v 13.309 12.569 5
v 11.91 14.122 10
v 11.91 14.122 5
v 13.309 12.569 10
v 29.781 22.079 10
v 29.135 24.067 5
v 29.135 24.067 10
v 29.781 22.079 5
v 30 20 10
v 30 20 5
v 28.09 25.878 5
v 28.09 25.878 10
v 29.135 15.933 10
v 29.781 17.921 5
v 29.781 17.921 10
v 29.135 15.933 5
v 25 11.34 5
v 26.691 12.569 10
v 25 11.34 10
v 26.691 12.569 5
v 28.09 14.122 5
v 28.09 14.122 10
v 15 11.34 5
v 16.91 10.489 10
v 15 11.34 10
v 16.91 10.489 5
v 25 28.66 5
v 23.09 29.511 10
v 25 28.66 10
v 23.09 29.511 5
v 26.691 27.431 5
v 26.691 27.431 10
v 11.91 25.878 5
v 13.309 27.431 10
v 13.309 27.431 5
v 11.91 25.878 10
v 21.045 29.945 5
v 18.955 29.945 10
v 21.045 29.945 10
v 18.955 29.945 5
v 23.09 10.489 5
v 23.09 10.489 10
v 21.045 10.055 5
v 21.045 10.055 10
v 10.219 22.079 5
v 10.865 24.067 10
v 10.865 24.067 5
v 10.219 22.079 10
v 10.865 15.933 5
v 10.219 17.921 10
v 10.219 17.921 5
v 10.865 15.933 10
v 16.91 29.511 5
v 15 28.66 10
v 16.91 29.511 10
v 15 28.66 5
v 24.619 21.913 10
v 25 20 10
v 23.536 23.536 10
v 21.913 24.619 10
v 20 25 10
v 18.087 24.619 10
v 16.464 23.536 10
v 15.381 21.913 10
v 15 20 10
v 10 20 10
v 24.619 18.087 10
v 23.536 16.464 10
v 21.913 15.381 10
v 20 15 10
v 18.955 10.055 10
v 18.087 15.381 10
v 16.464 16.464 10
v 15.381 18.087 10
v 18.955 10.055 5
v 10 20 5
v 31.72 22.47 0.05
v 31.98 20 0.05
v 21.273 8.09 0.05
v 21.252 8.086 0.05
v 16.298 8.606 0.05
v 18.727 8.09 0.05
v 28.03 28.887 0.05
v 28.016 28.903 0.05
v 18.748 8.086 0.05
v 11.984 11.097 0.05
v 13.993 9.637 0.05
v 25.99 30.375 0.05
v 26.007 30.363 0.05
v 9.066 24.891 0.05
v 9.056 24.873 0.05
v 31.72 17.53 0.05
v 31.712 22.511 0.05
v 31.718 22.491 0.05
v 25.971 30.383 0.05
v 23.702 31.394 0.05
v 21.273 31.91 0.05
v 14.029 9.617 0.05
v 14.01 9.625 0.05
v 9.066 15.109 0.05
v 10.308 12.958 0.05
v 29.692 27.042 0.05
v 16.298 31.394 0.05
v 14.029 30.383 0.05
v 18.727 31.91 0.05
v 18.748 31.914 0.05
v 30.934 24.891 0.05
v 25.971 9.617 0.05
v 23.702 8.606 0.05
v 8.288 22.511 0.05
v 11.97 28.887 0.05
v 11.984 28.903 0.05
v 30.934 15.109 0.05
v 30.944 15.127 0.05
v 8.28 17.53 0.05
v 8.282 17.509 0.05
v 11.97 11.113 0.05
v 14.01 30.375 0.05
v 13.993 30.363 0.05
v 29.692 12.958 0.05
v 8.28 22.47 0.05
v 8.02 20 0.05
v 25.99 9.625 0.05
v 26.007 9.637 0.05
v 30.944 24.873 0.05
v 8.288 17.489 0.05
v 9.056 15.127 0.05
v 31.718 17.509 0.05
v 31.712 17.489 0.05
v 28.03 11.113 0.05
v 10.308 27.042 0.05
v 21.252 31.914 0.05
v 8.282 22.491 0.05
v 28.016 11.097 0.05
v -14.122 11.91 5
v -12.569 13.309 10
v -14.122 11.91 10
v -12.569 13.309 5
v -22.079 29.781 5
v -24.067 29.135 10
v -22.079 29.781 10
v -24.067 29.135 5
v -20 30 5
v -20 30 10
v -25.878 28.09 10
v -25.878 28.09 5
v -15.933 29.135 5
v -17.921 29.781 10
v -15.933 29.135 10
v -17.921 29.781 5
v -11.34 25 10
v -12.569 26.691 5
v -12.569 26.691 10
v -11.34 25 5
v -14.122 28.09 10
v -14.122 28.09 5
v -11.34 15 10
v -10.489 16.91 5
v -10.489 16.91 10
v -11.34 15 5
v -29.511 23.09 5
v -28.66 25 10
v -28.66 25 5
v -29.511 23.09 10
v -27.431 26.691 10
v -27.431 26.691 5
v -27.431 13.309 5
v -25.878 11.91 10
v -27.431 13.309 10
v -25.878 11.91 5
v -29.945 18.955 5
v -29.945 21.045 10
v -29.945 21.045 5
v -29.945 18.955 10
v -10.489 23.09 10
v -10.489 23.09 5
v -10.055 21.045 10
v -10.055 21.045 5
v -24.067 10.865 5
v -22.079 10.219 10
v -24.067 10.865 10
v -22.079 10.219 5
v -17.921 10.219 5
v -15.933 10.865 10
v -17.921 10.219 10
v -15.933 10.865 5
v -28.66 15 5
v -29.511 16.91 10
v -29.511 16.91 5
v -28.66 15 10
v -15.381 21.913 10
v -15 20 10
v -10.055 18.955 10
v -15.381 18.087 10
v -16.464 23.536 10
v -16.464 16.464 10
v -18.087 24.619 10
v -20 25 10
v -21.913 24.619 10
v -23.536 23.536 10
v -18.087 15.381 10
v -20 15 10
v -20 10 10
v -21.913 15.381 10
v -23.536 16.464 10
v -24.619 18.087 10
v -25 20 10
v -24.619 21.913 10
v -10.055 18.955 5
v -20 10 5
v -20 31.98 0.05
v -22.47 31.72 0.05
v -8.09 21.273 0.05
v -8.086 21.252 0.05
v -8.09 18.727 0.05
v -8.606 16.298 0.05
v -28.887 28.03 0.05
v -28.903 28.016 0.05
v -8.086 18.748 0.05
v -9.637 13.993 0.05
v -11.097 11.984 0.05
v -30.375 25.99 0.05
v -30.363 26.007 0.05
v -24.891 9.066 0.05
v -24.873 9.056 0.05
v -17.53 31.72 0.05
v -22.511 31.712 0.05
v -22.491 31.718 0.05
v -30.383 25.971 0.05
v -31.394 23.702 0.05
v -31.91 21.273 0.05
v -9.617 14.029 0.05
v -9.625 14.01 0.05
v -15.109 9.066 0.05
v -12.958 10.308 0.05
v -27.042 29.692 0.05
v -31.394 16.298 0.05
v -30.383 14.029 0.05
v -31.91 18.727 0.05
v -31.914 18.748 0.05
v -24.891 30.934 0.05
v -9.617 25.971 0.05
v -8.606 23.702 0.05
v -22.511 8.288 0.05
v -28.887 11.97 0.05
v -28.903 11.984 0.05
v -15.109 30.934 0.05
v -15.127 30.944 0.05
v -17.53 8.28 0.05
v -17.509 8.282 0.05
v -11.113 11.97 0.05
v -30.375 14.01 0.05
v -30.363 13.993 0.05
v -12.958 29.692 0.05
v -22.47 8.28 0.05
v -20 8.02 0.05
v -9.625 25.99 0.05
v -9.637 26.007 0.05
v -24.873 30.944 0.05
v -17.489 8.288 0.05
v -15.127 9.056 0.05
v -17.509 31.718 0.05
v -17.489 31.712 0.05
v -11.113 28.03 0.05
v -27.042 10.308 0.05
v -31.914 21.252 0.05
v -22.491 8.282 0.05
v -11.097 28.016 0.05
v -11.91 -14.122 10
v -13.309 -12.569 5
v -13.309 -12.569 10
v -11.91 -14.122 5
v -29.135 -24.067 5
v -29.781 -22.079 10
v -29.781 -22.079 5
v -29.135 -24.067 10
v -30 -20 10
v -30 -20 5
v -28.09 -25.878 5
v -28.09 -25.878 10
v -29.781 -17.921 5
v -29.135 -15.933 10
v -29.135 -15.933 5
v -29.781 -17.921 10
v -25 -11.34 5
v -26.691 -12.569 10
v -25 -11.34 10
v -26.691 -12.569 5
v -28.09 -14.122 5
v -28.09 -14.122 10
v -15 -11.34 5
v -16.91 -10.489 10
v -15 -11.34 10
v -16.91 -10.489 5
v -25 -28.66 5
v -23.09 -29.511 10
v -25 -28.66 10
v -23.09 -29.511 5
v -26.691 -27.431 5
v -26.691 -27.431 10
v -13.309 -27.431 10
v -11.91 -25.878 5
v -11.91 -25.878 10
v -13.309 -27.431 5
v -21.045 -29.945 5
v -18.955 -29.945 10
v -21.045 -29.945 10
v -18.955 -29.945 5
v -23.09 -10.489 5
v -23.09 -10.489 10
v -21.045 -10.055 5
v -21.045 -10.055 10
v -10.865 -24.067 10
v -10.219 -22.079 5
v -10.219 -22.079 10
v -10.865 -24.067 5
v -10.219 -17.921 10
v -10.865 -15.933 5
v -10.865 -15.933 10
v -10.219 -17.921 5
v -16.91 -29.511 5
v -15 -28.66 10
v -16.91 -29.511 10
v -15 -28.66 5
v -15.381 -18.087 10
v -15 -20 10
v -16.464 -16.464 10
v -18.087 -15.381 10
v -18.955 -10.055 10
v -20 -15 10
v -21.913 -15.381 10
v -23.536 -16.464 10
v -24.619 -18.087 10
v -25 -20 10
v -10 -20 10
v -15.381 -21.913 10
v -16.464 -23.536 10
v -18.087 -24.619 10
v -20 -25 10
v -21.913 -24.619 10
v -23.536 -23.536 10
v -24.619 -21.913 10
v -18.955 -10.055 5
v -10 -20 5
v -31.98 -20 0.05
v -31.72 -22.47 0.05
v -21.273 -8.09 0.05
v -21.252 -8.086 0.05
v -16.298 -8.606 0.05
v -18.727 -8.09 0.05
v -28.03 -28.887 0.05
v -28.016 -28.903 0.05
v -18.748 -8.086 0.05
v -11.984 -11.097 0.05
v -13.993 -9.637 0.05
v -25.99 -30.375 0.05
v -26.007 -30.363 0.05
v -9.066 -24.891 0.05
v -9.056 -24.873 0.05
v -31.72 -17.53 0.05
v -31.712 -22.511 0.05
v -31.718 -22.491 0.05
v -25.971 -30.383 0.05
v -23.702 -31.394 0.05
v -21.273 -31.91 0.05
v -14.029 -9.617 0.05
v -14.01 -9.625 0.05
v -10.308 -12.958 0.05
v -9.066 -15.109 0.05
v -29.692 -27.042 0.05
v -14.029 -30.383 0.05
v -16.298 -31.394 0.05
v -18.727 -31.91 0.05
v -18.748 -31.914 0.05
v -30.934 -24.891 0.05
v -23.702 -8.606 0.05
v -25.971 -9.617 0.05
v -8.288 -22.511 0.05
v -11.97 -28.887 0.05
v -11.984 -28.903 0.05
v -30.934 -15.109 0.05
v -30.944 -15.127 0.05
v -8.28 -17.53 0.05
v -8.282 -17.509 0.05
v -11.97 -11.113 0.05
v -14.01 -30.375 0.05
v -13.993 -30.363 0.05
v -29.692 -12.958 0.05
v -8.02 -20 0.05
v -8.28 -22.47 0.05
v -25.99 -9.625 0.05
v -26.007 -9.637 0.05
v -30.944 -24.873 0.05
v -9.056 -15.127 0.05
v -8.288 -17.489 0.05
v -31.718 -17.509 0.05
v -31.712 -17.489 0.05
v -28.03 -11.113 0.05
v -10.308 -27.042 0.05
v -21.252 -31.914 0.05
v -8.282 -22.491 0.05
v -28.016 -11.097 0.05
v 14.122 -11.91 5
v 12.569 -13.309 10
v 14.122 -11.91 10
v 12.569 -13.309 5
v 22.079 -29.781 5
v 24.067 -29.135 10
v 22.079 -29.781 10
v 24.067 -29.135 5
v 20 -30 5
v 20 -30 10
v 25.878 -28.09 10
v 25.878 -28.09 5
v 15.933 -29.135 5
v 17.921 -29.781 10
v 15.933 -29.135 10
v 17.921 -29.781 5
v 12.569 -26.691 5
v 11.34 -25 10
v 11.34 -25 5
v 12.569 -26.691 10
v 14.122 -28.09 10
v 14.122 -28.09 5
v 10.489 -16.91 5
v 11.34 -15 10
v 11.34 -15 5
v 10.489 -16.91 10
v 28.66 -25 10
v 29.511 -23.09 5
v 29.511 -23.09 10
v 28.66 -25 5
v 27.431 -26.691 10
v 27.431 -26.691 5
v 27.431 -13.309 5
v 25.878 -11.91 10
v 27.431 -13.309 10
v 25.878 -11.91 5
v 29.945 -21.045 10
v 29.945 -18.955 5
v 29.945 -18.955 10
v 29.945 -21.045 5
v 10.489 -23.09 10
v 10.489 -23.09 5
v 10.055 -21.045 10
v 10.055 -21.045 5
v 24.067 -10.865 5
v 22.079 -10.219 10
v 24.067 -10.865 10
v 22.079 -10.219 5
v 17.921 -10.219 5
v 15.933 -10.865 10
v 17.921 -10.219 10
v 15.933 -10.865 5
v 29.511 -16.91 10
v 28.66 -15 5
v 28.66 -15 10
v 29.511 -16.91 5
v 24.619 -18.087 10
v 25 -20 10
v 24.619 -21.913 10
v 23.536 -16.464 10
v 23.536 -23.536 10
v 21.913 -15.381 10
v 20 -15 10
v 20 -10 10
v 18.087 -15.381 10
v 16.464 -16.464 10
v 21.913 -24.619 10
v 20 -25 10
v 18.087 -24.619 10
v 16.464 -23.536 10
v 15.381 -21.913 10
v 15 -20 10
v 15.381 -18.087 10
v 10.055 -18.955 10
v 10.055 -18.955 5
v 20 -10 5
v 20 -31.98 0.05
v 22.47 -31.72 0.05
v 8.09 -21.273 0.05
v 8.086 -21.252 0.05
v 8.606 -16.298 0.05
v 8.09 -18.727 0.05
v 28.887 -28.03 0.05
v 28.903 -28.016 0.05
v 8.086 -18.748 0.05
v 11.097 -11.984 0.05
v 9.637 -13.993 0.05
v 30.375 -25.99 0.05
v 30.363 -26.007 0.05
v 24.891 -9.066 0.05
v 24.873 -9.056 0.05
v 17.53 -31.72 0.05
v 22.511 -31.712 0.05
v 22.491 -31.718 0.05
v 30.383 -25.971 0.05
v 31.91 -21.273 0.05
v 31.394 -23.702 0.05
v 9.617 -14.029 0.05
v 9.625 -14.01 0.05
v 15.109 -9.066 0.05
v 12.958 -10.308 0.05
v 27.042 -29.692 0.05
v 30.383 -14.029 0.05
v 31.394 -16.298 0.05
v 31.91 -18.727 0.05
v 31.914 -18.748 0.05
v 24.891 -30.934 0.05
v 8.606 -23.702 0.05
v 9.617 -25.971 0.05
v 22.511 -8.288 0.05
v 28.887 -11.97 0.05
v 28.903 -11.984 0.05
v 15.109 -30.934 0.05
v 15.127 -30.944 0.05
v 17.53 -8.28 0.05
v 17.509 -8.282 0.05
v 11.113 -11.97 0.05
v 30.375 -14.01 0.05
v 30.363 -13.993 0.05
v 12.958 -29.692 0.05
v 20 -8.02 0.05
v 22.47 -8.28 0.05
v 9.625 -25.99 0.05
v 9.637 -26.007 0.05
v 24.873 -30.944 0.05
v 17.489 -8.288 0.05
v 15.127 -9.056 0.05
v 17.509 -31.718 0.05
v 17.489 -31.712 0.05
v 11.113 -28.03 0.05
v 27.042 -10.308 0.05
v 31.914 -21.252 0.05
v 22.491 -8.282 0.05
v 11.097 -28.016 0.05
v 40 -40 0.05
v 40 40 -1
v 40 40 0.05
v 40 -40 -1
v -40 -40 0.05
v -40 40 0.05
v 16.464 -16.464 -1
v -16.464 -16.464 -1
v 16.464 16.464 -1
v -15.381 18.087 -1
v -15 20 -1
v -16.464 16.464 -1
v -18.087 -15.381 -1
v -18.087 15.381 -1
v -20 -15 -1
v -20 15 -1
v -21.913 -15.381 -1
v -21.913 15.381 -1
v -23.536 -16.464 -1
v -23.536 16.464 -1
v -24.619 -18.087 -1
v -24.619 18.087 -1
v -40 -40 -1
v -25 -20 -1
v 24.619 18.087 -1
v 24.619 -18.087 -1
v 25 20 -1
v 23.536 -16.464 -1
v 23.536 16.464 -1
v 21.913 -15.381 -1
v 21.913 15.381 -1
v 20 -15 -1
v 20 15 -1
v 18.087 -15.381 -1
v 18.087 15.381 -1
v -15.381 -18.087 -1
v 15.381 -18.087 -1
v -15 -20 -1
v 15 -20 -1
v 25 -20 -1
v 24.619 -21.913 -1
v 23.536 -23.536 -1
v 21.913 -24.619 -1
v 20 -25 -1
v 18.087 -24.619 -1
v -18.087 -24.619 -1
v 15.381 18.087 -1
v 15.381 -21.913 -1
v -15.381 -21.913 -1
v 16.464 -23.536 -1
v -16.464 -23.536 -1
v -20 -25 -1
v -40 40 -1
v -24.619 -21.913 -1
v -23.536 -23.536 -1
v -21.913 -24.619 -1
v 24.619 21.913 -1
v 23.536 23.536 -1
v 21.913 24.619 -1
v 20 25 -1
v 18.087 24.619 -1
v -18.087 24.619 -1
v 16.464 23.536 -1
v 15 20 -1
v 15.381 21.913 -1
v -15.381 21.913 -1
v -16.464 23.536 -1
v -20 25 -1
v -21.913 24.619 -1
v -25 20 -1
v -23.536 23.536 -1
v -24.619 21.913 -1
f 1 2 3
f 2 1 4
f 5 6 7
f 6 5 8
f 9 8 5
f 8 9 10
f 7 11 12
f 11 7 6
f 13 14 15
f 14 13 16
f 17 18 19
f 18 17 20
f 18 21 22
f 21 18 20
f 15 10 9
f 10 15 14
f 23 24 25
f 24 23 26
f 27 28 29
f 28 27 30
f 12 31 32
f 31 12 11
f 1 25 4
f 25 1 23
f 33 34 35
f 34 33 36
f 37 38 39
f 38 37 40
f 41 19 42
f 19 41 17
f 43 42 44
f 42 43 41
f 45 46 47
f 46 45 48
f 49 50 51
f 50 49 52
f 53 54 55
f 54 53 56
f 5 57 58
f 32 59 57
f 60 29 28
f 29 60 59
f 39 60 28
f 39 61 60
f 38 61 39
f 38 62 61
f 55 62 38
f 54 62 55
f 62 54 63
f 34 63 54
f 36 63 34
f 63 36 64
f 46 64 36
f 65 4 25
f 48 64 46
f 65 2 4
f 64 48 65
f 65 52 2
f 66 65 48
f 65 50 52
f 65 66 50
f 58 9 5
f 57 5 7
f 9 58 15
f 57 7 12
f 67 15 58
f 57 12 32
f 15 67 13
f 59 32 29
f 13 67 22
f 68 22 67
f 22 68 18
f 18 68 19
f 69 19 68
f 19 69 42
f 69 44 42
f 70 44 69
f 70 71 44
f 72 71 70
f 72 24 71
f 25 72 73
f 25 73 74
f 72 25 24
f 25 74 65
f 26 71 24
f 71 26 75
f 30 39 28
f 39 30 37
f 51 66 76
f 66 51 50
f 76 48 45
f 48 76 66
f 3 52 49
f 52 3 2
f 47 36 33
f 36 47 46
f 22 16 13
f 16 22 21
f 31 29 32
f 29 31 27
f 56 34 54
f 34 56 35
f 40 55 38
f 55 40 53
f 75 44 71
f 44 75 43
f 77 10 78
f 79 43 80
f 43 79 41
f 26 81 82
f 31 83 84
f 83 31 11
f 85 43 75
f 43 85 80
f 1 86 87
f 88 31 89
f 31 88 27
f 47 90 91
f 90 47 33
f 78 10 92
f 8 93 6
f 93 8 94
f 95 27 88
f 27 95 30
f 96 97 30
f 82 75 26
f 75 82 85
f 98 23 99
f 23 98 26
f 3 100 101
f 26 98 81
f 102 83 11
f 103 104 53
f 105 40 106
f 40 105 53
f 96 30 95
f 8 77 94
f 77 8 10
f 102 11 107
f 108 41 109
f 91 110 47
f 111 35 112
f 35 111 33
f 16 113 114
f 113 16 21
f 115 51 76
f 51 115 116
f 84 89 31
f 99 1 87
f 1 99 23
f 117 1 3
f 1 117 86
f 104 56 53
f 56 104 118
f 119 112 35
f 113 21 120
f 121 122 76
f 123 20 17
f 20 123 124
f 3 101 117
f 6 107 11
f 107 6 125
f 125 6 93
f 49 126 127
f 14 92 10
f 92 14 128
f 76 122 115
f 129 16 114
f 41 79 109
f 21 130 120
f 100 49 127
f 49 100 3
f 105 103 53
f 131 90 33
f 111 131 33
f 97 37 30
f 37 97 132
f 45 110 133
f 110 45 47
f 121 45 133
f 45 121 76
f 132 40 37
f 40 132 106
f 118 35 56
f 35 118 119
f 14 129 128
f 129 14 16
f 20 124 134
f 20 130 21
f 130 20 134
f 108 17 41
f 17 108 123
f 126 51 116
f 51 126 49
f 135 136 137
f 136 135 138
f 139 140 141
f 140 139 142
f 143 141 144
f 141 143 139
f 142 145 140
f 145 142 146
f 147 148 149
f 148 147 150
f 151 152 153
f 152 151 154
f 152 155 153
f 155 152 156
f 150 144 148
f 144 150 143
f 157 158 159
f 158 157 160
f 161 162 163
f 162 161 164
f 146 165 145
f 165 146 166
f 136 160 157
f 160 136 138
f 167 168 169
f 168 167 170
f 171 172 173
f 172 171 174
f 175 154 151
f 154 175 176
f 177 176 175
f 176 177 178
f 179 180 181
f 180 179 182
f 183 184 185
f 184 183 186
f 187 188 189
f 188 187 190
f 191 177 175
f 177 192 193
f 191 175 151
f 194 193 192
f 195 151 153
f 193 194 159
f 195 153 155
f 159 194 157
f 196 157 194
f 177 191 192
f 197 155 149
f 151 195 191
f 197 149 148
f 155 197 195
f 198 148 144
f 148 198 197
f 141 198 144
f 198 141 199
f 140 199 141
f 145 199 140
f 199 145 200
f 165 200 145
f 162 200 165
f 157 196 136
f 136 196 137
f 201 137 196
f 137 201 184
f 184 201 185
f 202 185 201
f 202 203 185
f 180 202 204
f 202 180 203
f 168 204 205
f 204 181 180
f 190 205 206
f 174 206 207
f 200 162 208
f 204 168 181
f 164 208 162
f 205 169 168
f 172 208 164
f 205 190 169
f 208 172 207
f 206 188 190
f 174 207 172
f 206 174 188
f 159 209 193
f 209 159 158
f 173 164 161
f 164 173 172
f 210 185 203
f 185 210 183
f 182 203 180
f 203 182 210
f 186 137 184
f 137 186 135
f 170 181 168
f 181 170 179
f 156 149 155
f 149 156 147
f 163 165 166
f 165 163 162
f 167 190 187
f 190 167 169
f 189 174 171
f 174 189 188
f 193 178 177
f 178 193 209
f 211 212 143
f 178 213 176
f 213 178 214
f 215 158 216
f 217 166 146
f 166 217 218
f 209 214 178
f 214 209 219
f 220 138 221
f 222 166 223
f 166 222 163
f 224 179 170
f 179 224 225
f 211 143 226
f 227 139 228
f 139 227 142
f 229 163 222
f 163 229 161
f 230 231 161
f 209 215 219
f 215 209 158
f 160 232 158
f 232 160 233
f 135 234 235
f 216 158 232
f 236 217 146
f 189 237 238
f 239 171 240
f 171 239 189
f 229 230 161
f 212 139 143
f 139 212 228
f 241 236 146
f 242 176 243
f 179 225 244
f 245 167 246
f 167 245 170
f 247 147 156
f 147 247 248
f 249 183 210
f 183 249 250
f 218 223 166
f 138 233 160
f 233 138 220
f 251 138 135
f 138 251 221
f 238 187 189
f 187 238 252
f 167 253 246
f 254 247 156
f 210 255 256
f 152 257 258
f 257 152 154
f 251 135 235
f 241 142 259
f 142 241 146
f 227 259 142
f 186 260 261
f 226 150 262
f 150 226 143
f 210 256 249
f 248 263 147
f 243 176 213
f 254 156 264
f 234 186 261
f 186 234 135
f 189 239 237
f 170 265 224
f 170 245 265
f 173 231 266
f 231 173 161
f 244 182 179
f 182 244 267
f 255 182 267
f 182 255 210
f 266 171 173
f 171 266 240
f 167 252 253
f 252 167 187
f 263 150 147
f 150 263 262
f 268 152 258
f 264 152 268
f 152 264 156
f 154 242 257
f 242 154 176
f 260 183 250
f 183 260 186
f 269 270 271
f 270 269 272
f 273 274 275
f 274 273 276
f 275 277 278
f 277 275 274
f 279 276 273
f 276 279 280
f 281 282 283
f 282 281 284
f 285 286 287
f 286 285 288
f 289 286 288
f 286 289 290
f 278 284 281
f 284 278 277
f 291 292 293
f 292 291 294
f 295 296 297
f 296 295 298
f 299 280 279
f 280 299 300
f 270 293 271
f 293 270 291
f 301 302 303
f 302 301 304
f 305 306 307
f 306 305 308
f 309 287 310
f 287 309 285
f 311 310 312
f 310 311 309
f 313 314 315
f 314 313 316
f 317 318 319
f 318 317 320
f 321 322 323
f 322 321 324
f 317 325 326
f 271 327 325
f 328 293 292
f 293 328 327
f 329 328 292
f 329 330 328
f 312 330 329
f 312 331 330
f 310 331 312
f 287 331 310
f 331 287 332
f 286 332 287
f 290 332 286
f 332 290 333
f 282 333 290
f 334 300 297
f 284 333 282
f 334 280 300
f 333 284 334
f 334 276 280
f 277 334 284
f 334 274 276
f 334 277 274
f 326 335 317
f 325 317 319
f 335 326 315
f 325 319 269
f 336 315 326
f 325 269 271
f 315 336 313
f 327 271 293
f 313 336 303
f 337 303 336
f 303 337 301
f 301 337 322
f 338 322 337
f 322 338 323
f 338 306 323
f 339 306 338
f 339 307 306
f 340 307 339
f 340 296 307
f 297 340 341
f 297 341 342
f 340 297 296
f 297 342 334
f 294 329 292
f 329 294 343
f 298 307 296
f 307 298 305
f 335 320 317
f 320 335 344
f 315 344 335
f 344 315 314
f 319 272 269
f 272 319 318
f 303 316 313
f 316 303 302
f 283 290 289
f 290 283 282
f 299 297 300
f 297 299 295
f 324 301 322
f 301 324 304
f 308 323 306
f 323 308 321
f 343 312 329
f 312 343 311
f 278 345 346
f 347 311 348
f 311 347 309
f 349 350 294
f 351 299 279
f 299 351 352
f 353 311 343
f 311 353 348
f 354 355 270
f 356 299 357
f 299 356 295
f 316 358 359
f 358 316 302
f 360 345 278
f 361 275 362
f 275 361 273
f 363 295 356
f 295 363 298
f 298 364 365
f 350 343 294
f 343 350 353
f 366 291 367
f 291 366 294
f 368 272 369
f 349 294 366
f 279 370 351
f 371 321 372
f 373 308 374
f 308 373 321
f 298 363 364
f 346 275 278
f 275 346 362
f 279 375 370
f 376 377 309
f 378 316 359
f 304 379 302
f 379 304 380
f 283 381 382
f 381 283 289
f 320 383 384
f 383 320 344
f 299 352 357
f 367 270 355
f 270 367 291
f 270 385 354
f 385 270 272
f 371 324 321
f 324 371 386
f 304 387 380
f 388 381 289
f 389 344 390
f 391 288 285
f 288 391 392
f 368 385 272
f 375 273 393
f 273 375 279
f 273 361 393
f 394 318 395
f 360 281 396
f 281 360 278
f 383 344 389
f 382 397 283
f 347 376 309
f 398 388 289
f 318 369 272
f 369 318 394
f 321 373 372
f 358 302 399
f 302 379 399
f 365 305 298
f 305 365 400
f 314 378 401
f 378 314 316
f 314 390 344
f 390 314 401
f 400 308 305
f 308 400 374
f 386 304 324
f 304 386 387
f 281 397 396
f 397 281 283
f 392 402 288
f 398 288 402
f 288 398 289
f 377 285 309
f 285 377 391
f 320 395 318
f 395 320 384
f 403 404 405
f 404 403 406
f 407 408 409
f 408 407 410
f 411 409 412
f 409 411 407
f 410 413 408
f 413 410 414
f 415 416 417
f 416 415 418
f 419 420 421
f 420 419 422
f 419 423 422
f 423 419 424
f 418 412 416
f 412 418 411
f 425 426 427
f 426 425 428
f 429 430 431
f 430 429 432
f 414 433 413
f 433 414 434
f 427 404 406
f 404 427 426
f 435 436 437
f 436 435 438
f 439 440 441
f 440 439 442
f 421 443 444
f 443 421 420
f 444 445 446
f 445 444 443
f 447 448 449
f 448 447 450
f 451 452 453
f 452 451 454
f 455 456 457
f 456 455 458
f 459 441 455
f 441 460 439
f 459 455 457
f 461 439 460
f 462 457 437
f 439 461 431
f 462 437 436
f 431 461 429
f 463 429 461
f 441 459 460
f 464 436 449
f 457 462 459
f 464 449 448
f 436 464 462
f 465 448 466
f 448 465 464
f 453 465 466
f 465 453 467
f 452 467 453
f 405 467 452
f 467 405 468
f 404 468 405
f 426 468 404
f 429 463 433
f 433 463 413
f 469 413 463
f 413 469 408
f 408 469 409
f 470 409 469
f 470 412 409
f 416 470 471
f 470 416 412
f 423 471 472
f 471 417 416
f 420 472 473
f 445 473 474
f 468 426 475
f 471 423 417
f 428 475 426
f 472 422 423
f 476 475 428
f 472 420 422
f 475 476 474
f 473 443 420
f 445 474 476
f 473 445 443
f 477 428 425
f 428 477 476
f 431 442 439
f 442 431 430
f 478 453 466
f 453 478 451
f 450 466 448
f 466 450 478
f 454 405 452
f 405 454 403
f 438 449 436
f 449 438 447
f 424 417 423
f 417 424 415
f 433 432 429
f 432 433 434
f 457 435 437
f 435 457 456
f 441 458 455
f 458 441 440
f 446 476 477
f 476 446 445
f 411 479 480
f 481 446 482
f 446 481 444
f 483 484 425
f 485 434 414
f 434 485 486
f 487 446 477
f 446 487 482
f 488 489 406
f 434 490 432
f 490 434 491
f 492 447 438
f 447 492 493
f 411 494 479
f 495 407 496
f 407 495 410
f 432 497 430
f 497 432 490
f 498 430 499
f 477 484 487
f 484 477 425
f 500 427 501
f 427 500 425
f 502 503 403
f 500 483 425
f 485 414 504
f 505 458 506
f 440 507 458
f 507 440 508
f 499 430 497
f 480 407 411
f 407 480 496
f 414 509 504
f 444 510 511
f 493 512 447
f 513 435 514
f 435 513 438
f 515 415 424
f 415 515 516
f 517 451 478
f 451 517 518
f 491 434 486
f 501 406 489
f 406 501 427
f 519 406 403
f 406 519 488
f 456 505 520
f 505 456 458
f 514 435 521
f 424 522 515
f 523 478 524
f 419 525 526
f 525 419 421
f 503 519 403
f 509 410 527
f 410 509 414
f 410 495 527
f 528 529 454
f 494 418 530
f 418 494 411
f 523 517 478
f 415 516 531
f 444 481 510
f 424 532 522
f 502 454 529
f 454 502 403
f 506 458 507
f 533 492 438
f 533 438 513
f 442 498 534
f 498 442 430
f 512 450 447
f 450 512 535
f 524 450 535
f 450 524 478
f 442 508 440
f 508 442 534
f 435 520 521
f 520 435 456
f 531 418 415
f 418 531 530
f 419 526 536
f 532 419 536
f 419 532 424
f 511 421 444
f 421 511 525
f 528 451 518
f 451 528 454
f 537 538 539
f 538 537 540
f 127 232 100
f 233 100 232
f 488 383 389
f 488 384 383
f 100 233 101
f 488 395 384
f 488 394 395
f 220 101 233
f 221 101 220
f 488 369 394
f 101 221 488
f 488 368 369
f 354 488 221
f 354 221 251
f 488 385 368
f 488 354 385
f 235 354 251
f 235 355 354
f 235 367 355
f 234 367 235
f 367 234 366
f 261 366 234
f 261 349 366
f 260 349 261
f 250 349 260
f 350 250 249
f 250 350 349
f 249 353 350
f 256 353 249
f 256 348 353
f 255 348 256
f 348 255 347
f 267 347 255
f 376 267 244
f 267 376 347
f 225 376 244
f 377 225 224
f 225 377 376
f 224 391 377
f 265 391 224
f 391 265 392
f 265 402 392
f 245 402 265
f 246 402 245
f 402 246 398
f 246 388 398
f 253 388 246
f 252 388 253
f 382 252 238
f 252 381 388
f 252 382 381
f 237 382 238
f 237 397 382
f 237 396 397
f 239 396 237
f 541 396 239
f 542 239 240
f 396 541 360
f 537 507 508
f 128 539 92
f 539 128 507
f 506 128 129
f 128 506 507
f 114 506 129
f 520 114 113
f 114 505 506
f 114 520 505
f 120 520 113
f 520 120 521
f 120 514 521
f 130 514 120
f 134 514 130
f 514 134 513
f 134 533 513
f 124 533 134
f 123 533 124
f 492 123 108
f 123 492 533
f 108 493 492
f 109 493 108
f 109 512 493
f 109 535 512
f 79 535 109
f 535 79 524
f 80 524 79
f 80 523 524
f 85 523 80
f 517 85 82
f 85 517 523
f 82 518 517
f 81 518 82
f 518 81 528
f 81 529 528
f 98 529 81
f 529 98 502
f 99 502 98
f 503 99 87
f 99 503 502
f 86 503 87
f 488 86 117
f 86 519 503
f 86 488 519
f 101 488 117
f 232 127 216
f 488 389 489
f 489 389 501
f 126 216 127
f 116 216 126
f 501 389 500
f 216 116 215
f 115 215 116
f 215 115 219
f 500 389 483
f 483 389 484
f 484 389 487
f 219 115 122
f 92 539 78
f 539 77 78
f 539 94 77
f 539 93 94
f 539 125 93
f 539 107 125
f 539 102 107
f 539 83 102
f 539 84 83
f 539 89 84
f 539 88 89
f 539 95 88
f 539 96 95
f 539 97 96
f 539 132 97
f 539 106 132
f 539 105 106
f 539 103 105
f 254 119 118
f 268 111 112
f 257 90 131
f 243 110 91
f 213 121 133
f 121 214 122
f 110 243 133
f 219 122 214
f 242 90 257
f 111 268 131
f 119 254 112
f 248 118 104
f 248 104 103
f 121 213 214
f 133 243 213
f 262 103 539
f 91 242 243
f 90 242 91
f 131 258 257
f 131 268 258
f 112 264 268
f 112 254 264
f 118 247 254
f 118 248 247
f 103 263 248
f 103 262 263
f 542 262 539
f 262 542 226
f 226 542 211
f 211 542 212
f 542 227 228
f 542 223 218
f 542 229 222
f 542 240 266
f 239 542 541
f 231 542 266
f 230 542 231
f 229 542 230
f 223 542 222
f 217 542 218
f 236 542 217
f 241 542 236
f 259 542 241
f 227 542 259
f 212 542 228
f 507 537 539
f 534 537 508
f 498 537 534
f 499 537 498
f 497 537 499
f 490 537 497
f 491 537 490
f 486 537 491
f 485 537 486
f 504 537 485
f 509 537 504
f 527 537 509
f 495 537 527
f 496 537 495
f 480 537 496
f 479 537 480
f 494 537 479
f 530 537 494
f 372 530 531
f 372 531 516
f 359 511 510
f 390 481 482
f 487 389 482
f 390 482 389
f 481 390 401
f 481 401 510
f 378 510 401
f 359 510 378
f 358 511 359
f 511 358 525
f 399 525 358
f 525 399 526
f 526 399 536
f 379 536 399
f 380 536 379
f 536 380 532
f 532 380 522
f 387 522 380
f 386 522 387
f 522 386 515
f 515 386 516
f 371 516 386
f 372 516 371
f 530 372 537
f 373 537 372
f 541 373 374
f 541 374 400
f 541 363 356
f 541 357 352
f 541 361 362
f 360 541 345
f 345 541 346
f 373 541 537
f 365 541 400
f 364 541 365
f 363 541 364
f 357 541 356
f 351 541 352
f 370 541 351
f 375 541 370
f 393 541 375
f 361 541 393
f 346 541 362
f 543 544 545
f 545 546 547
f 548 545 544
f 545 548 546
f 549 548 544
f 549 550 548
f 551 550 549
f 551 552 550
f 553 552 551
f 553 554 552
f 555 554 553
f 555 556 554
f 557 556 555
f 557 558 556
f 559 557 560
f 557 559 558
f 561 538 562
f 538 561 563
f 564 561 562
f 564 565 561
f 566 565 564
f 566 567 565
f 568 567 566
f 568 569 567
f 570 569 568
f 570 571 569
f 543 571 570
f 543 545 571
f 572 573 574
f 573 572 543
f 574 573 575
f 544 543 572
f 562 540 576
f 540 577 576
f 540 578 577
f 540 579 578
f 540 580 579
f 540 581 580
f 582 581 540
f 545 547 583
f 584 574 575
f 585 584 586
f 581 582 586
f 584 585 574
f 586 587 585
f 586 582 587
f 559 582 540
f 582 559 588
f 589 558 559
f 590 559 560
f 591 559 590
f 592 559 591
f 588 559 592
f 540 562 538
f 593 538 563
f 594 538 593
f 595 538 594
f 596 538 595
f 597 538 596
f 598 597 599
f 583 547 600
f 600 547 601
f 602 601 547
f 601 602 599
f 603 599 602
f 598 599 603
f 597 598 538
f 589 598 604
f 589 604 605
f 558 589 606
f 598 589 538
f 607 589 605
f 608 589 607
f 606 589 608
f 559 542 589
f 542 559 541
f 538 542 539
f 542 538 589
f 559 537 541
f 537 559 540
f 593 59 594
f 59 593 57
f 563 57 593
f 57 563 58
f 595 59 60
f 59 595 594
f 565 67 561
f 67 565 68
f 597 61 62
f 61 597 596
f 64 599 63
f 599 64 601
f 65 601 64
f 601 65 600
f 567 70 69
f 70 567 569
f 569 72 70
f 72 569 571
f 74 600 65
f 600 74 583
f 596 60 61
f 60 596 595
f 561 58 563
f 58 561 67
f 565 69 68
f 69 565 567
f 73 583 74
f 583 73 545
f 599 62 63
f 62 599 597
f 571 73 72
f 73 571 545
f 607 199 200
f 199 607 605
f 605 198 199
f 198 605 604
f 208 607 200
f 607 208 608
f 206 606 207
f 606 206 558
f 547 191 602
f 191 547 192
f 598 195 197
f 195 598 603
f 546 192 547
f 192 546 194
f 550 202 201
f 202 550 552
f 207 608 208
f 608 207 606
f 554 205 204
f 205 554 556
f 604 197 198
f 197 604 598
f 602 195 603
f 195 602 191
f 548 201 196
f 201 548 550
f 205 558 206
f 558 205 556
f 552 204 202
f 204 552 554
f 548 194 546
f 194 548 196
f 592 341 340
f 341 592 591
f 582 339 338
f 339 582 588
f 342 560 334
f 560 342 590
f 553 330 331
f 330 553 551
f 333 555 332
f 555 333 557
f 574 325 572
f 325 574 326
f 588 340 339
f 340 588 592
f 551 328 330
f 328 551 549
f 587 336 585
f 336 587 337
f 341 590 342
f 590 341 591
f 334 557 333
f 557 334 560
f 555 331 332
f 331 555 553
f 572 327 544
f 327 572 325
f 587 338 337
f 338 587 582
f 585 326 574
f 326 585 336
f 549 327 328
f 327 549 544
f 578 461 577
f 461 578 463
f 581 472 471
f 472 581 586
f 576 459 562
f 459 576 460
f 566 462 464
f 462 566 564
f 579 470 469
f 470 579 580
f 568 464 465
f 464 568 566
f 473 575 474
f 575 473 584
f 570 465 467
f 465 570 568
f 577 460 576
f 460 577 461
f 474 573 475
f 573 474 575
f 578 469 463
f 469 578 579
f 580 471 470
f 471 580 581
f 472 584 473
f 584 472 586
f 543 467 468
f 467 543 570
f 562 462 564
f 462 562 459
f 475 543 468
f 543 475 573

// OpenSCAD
screw_dist=40; // PCB hole spacing (square)
height=10; // peg height
peg_d=20; // peg diameter
screw_d=10; // hole diameter
tol=0.05; // used for CSG subtraction/addition
plate_th= 1;

module peg(action)
{
  if(action=="position")
  {
    for(r=[0:90:359])
      rotate([0,0,r])
        translate([screw_dist/2,screw_dist/2,0])
        {
         for(i=[0:$children-1])
           children(i); // do the shapes that come after us!
        }
  }
  else if(action=="add")
  {
    // main cylindrical body
    cylinder(r=peg_d/2,h=height);
    // with a tronconic base (bevel)
    cylinder(r1=peg_d/2+2,r2=peg_d/2,h=5);
  }
  else // "remove"
  {
    translate([0,0,-tol -plate_th]) // screw hole
      cylinder(r=screw_d/2,h=height+2*tol+plate_th); // through hole
  }
}

// Helper module: centered cube on (X,Y) but not on Z, like cylinder
module centered_cube(size)
{
  translate([-size[0]/2, -size[1]/2, 0])
    cube(size);
}

difference()
{
  union()
  {
    // Now call and build the four pegs
    peg("position")
      peg("add");

    color([0,0,1])
      translate([0,0,-plate_th])
        centered_cube([
          screw_dist+peg_d*2,
          screw_dist+peg_d*2,
          plate_th+tol]); // higher to avoid gaps with the pegs!
  }

  // And finally carve the pegs (all through the plate itself)
  peg("position")
    peg("remove");
}
